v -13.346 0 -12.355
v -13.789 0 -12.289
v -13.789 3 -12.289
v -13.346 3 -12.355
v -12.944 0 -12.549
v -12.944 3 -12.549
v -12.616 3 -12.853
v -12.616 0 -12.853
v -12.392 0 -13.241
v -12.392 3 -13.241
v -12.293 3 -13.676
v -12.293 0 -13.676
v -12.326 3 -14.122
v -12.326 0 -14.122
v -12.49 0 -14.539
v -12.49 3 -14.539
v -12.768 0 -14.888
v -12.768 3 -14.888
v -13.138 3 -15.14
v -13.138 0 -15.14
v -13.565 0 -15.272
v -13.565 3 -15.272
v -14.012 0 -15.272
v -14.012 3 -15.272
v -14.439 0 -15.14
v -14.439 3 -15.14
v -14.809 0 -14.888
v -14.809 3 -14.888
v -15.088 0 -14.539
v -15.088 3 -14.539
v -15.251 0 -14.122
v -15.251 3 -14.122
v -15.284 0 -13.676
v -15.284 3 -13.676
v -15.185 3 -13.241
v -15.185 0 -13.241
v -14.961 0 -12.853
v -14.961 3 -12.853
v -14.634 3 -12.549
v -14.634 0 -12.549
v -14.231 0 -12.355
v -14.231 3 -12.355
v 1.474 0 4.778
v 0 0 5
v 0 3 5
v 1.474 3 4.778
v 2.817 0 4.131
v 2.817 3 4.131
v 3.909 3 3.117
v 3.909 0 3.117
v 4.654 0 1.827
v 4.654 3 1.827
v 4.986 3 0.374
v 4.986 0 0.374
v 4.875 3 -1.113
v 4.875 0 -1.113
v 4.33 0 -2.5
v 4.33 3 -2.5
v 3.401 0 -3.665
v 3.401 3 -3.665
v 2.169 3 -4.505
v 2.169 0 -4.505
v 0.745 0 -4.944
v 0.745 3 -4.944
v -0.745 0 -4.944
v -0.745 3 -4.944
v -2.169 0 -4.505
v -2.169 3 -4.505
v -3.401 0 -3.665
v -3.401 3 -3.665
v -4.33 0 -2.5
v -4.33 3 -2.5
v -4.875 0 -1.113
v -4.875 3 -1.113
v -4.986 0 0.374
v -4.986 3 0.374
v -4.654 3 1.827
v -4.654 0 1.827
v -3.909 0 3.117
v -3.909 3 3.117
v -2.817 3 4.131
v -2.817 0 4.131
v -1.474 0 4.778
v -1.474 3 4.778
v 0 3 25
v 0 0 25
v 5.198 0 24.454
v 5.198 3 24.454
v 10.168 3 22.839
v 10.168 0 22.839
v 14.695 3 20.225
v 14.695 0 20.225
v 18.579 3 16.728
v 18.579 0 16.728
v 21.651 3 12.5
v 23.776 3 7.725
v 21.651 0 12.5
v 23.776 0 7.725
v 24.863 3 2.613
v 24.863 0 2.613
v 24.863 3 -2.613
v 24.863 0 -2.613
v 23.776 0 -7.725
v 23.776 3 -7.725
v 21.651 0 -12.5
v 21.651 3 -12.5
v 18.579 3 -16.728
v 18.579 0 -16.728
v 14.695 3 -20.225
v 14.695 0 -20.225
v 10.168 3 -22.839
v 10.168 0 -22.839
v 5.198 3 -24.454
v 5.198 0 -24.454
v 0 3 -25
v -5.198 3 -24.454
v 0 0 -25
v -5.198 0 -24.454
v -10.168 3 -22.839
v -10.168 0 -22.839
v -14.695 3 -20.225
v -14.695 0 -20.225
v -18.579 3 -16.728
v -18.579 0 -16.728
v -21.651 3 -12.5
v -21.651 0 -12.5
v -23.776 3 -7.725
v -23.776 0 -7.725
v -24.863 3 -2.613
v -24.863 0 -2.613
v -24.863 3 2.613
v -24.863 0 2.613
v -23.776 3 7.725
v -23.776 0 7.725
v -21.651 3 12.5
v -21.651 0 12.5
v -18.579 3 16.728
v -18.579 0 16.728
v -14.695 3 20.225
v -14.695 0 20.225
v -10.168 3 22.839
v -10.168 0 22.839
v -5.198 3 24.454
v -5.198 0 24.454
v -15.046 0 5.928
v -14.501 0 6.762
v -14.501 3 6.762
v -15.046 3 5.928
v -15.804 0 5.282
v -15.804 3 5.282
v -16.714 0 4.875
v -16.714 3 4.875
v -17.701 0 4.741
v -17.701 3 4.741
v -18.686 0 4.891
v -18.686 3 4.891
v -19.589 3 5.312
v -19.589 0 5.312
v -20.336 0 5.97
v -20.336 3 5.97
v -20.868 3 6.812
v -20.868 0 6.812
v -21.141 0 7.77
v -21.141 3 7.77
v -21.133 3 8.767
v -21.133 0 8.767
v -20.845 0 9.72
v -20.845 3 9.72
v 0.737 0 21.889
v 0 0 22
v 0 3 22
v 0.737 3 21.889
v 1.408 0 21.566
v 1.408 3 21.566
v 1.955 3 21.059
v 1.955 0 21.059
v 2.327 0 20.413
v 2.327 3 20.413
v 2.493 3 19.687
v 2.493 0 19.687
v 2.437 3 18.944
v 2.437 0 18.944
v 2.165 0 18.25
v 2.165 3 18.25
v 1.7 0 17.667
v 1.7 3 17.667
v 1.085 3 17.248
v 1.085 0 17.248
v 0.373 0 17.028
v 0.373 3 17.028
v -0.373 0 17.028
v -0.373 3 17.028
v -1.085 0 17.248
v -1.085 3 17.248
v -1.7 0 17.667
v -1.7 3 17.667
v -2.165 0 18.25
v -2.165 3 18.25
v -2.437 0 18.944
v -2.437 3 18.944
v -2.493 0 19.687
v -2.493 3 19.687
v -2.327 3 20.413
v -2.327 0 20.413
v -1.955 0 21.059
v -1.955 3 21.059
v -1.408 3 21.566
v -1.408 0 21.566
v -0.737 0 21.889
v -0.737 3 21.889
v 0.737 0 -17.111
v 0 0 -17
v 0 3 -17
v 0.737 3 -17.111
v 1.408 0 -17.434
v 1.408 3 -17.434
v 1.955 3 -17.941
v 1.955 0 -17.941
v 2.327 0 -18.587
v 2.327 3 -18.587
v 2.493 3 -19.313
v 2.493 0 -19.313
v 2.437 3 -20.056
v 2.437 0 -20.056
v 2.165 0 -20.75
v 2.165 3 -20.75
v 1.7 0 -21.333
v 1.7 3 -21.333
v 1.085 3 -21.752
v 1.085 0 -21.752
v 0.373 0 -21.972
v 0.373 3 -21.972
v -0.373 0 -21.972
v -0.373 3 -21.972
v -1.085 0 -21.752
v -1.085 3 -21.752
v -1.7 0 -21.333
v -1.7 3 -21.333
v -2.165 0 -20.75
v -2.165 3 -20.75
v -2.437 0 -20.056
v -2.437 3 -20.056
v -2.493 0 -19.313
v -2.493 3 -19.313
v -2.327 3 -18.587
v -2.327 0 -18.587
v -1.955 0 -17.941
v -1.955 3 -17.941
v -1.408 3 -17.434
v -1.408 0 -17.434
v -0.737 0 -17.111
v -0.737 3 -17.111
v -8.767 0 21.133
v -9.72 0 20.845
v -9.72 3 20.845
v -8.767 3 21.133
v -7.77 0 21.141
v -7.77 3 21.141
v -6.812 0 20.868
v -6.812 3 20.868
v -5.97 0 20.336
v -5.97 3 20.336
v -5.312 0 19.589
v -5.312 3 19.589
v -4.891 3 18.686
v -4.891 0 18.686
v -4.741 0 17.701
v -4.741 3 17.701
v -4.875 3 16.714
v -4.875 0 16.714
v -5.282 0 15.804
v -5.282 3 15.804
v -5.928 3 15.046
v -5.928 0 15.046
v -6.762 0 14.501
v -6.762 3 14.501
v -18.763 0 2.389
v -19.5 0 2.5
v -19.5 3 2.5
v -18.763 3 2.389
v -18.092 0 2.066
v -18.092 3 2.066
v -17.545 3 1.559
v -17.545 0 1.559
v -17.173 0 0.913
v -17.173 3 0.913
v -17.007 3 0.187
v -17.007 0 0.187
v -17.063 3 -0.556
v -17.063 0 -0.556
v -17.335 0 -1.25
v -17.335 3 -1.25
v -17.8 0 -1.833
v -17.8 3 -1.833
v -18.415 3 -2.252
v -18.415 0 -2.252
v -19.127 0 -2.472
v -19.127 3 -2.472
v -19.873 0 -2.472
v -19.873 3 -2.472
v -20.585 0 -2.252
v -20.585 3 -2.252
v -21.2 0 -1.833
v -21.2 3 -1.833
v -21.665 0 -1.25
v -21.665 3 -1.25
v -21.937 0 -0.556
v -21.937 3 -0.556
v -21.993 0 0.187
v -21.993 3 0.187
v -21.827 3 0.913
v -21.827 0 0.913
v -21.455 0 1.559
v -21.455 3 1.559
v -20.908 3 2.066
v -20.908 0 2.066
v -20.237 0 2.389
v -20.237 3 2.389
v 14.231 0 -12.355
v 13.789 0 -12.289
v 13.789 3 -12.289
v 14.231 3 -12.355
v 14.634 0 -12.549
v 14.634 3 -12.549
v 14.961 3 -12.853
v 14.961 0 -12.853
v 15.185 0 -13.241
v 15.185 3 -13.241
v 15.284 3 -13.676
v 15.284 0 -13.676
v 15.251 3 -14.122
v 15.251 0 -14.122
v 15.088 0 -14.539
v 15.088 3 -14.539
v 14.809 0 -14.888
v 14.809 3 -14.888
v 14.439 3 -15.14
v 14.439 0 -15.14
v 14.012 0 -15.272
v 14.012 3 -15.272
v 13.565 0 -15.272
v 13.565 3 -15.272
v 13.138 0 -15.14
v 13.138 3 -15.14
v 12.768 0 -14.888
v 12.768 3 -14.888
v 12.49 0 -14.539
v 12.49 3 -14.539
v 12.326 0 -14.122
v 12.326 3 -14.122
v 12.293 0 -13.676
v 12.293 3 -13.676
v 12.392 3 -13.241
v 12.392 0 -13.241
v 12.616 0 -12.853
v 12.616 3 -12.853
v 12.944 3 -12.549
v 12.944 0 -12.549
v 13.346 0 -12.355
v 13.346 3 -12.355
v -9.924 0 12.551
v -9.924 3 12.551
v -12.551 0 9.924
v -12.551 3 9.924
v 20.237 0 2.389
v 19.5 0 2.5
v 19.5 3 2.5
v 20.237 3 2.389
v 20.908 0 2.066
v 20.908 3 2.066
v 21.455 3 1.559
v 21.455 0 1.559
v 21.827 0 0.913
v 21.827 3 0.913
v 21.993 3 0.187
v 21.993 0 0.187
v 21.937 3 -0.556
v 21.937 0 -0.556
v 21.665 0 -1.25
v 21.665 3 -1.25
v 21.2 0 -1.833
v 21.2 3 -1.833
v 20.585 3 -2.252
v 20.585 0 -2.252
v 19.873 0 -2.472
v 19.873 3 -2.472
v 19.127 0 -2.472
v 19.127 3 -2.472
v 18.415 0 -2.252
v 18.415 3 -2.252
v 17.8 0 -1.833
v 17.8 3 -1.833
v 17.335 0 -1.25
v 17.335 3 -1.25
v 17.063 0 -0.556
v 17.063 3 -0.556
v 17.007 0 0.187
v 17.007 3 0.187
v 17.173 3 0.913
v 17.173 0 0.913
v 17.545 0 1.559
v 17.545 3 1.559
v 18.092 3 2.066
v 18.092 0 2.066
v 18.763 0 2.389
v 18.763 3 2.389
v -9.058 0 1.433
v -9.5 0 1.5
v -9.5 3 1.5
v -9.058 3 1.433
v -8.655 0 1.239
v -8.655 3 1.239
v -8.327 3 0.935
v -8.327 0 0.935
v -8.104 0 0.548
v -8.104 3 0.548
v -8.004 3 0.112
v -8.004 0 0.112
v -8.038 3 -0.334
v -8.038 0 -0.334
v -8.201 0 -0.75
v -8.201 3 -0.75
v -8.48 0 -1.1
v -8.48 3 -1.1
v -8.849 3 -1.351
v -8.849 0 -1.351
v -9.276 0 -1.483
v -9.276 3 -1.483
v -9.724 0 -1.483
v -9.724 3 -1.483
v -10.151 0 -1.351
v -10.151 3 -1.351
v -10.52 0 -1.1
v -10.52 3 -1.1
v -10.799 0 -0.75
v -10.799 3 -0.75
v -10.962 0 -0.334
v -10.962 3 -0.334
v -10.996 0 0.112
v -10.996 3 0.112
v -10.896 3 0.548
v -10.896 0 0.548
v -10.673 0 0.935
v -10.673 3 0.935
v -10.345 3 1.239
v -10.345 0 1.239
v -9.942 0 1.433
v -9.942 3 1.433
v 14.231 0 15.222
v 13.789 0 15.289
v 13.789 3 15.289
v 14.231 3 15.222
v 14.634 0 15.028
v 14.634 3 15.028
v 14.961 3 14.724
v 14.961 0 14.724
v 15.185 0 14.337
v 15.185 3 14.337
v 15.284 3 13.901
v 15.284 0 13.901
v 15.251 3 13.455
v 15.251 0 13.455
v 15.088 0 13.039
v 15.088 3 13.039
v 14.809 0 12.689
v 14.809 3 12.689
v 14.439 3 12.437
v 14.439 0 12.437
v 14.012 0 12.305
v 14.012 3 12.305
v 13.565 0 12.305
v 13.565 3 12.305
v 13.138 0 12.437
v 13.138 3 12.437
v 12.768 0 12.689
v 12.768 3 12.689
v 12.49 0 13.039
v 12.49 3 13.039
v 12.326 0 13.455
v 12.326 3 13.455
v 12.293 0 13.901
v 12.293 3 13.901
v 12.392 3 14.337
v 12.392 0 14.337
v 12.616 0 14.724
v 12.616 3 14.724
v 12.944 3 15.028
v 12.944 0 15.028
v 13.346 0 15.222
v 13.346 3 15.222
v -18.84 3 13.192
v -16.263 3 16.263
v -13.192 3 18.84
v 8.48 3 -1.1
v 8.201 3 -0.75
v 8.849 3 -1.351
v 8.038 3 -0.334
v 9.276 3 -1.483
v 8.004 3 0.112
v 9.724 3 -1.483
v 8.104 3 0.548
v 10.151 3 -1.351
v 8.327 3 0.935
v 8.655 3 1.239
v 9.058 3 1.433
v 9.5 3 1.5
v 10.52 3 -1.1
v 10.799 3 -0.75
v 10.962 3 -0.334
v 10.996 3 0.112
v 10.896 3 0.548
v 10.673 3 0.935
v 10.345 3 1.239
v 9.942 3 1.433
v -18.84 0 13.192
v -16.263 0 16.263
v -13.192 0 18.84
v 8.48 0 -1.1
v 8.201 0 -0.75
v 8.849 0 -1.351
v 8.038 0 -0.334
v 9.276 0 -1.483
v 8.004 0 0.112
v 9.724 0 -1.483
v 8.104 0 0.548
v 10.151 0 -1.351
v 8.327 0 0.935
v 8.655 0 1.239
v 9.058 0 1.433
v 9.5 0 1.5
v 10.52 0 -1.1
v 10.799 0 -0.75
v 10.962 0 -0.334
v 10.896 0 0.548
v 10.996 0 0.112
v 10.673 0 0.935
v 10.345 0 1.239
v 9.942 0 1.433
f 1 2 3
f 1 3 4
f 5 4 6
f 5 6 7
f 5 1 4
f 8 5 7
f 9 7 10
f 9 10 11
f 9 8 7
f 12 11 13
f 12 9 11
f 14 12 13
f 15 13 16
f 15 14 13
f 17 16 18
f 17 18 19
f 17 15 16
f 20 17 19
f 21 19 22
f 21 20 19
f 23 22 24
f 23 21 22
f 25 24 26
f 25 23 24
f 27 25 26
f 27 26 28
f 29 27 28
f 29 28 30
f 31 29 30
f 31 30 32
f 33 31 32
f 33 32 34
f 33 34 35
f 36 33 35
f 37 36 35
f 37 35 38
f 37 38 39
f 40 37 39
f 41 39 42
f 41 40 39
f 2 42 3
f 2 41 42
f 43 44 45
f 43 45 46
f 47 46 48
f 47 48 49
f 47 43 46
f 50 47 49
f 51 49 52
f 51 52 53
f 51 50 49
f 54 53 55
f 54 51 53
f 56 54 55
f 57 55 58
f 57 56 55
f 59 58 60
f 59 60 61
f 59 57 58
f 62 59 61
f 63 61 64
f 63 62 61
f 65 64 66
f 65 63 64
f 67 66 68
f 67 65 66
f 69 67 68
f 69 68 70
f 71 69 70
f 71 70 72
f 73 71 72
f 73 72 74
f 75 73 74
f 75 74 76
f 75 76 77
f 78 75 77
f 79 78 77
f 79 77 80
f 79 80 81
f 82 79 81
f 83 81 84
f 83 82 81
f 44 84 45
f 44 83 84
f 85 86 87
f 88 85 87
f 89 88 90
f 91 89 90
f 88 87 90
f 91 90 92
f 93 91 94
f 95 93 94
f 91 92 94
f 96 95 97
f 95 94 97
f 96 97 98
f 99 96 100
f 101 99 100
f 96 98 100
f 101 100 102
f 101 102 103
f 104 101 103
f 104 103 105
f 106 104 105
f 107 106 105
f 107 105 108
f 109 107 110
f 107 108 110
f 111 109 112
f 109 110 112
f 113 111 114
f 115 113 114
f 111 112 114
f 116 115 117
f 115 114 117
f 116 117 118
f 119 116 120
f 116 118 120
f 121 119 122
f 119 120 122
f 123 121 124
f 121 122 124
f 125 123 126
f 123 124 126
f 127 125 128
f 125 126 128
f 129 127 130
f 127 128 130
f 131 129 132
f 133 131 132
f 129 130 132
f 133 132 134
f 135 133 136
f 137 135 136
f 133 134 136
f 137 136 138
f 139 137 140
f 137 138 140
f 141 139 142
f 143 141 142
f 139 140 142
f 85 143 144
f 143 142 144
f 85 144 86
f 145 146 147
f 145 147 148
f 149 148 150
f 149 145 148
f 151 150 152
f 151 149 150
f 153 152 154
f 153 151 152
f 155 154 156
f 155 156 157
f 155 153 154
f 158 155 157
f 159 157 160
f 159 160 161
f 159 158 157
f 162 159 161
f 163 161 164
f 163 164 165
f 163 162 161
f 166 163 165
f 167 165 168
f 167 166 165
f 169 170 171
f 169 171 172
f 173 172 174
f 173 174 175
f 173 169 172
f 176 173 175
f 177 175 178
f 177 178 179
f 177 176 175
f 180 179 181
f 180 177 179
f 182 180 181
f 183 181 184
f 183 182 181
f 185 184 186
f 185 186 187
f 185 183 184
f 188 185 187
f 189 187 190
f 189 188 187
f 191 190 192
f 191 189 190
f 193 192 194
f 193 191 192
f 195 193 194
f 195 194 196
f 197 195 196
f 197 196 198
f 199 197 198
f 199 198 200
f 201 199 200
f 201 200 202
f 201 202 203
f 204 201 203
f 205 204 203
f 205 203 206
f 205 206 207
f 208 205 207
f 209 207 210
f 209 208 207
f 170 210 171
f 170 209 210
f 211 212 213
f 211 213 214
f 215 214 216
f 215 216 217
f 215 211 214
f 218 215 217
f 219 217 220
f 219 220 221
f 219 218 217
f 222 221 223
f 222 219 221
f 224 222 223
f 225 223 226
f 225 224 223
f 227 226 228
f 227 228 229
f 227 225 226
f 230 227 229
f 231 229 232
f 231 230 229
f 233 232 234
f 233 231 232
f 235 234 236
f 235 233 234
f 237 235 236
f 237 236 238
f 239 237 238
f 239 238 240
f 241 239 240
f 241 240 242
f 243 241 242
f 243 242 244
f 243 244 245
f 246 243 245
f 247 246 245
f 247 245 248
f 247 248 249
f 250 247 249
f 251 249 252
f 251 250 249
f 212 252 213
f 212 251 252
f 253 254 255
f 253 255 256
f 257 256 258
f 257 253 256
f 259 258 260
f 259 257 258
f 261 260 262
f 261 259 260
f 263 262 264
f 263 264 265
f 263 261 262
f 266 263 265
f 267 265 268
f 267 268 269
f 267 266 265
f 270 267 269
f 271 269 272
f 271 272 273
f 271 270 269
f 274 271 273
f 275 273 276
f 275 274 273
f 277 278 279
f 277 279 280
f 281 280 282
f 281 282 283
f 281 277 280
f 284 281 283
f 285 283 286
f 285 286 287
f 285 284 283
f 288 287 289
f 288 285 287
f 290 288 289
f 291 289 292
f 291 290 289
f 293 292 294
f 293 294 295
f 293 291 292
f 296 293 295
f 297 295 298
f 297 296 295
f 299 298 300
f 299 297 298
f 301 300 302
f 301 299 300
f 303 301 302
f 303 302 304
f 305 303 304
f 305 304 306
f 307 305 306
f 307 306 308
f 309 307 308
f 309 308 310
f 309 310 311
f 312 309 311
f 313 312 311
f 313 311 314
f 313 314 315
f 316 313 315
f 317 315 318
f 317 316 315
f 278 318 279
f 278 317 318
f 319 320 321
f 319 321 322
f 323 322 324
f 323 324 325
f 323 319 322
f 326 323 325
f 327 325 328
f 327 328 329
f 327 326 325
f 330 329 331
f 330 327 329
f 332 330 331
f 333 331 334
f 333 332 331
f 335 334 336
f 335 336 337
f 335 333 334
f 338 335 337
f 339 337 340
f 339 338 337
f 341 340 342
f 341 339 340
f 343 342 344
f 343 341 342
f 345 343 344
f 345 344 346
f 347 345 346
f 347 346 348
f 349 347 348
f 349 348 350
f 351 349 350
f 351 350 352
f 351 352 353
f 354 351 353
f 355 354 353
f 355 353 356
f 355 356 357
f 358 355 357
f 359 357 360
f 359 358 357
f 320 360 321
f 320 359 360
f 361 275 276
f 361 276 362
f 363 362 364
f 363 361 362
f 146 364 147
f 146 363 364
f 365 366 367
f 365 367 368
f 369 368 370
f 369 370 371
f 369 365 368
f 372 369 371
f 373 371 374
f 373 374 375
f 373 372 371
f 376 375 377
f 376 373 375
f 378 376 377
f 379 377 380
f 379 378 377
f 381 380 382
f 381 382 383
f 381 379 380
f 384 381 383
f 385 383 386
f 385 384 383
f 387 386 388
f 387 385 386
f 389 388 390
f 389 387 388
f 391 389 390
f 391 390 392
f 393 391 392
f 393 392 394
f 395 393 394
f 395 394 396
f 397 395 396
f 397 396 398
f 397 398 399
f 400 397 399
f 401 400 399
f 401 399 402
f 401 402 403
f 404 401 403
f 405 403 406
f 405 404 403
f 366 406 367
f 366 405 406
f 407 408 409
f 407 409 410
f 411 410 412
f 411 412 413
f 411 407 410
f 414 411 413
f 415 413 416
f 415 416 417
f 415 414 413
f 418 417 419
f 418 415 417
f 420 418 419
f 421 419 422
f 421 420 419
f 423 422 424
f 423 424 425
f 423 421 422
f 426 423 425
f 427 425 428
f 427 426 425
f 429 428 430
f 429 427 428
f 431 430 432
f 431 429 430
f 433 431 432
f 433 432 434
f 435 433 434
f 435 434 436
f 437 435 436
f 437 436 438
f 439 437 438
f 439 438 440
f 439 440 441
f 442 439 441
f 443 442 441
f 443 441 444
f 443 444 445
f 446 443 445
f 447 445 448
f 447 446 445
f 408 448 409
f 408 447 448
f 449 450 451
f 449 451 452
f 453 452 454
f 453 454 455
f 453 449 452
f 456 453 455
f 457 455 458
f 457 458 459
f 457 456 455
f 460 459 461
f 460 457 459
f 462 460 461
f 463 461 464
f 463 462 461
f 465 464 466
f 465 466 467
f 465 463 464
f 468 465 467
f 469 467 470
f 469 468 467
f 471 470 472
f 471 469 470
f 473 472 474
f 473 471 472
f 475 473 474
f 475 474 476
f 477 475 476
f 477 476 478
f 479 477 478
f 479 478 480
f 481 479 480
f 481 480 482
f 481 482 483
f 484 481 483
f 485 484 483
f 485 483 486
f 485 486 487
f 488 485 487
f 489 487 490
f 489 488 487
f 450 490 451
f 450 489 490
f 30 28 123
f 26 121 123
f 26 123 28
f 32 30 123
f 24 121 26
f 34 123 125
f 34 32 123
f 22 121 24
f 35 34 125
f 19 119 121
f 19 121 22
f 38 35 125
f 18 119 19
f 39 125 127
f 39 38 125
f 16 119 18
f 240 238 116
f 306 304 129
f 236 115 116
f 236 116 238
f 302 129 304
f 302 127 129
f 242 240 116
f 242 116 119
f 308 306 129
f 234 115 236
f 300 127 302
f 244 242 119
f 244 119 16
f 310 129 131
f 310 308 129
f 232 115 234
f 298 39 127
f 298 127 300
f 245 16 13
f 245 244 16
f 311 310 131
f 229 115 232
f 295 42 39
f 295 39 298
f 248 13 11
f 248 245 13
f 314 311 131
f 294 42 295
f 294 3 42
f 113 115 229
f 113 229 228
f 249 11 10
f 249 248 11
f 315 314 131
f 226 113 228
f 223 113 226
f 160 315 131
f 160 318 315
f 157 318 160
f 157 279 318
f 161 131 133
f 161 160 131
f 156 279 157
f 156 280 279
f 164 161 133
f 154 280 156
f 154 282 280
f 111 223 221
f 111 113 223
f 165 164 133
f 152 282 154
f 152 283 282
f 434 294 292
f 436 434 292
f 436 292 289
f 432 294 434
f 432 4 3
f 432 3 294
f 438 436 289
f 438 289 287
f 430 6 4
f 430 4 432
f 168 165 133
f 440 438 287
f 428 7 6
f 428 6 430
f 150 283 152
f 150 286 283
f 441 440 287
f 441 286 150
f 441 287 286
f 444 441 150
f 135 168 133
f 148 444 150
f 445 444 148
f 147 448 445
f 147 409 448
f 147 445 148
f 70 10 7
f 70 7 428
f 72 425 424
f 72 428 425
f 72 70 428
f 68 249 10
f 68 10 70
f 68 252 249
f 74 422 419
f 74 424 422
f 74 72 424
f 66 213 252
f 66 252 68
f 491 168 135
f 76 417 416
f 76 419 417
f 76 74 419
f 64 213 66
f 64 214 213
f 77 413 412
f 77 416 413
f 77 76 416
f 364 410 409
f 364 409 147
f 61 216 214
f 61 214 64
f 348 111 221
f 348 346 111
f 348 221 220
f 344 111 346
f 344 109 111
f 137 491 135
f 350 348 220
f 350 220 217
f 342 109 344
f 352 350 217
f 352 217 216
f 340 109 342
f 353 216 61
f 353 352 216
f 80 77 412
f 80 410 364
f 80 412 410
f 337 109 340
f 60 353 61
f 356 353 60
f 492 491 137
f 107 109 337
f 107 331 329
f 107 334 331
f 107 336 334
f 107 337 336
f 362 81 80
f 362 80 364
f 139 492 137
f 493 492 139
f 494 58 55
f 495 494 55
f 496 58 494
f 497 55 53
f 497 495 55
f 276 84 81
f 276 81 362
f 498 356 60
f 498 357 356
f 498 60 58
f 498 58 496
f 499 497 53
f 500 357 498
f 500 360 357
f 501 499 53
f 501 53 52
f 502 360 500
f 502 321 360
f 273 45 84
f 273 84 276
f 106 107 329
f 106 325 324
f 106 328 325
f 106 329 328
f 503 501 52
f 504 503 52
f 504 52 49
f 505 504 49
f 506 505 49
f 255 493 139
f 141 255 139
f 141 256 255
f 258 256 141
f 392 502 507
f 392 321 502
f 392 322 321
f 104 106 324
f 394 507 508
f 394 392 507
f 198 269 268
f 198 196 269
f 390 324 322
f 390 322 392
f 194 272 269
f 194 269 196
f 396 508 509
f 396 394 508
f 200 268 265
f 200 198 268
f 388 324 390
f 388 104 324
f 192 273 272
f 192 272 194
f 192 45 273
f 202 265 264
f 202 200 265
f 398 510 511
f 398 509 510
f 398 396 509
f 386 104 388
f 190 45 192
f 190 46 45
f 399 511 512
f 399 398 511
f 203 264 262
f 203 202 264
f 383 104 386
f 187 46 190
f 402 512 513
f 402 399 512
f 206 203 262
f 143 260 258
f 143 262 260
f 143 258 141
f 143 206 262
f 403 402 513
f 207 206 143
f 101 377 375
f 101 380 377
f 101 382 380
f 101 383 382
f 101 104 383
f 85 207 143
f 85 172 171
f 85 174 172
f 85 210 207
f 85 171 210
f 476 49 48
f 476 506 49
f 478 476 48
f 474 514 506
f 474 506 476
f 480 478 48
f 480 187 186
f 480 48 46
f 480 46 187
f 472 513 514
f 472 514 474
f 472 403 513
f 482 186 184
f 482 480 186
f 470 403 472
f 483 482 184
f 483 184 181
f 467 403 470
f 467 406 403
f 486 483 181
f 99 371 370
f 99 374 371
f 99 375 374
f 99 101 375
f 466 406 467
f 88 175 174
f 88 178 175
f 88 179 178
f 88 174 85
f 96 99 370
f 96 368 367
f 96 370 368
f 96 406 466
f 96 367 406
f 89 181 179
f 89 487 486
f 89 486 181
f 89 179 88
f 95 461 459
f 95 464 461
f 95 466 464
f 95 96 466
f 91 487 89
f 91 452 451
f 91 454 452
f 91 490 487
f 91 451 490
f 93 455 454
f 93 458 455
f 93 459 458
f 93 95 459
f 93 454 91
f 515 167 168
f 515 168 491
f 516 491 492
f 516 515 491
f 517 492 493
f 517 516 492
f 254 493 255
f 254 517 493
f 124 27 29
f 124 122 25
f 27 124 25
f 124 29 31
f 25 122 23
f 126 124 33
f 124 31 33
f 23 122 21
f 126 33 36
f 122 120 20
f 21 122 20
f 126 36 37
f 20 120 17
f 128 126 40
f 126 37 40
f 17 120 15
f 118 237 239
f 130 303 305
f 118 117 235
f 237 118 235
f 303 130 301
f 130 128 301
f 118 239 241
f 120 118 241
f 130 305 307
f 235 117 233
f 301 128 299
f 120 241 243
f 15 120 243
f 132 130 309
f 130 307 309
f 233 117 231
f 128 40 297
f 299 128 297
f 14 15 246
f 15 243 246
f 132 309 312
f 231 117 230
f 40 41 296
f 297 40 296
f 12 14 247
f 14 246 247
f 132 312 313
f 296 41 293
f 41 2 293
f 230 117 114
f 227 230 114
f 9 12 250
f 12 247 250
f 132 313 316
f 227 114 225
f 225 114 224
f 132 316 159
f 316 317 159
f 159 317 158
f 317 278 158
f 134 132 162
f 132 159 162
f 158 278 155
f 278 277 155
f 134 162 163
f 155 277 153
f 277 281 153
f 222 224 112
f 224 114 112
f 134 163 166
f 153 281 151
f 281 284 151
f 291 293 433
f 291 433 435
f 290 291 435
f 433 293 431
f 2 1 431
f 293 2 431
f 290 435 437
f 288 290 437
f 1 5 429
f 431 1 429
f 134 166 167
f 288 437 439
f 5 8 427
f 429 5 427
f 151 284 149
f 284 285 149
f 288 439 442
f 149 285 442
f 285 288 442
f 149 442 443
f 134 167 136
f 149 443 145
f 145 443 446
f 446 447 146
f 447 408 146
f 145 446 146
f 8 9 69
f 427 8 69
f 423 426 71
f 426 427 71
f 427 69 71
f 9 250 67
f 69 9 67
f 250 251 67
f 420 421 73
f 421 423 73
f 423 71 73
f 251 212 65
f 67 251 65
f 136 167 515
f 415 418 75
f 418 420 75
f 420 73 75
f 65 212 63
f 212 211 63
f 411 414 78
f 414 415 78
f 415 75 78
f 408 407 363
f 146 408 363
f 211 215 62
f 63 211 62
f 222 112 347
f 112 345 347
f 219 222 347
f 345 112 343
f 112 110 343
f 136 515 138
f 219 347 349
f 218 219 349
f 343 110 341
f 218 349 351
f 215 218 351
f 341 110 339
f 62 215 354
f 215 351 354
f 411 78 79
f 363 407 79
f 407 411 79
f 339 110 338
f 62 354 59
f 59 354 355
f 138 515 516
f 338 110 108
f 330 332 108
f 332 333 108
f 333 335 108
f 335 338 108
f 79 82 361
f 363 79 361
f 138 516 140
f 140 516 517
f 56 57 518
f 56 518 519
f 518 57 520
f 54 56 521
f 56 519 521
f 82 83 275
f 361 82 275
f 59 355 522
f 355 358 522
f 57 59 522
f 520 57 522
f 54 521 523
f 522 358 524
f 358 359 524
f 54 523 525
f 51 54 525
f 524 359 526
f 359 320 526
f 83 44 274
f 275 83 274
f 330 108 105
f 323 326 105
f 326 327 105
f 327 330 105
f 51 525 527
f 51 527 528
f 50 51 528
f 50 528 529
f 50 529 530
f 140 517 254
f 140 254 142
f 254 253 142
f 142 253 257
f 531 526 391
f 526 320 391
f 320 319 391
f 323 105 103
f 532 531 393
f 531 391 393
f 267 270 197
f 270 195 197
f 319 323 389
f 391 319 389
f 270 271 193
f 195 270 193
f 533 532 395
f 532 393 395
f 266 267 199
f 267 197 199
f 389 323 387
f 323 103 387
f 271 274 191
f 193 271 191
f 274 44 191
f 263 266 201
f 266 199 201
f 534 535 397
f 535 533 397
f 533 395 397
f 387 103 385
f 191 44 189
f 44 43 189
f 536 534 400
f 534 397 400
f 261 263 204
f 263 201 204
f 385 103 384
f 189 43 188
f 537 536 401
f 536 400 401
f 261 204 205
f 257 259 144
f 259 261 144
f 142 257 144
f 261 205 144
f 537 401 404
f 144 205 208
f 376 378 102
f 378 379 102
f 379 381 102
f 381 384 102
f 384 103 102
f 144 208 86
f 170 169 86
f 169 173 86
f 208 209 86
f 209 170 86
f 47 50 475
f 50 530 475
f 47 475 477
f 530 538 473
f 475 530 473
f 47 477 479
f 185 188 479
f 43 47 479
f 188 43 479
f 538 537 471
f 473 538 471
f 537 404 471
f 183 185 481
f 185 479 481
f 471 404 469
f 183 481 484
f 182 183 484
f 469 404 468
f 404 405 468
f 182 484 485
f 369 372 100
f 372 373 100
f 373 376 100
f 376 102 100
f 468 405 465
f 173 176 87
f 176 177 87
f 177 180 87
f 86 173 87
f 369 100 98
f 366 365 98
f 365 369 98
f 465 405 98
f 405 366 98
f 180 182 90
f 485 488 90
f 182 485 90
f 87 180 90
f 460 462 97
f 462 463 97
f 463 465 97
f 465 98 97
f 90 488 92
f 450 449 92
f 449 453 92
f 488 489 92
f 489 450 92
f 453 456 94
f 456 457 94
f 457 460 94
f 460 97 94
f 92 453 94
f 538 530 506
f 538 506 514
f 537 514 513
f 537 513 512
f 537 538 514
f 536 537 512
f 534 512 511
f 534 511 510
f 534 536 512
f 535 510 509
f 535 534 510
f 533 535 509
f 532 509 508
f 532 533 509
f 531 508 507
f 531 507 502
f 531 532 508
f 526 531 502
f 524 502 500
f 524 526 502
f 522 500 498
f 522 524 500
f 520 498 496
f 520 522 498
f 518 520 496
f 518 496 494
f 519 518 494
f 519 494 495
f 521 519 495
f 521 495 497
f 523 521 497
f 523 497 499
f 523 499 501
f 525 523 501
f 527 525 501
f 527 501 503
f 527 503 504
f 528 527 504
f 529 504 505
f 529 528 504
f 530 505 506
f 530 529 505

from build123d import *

# Parameters (mm, degrees)
SKETCH_1_R      = 25
SKETCH_1_R_2    = 5
SKETCH_1_R_3    = 1.5
SKETCH_1_R_4    = 2.5
EXTRUDE_1_DEPTH = 3


with BuildPart() as part:
    # 草圖1 → 填料-伸長1 (new body)
    with BuildSketch(Plane(origin=(0, 0, 0), x_dir=(1, 0, 0), z_dir=(0, 1, 0))):
        with Locations(Location((0, 0, 0), (0, 0, 270))):
            Circle(SKETCH_1_R)
        with Locations(Location((0, 0, 0), (0, 0, 270))):
            Circle(SKETCH_1_R_2, mode=Mode.SUBTRACT)
        with Locations(Location((-9.5, 0, 0), (0, 0, 270))):
            Circle(SKETCH_1_R_3, mode=Mode.SUBTRACT)
        with Locations(Location((9.5, 0, 0), (0, 0, 270))):
            Circle(SKETCH_1_R_3, mode=Mode.SUBTRACT)
        with Locations(Location((0, 19.5, 0), (0, 0, 270))):
            Circle(SKETCH_1_R_4, mode=Mode.SUBTRACT)
        with Locations(Location((19.5, 0, 0), (0, 0, 270))):
            Circle(SKETCH_1_R_4, mode=Mode.SUBTRACT)
        with Locations(Location((0, -19.5, 0), (0, 0, 270))):
            Circle(SKETCH_1_R_4, mode=Mode.SUBTRACT)
        with Locations(Location((-19.5, 0, 0), (0, 0, 270))):
            Circle(SKETCH_1_R_4, mode=Mode.SUBTRACT)
        with Locations(Location((-13.788582233, 13.788582233, 0), (0, 0, 270))):
            Circle(SKETCH_1_R_3, mode=Mode.SUBTRACT)
        with Locations(Location((13.788582233, 13.788582233, 0), (0, 0, 270))):
            Circle(SKETCH_1_R_3, mode=Mode.SUBTRACT)
        with Locations(Location((13.788582233, -13.788582233, 0), (0, 0, 270))):
            Circle(SKETCH_1_R_3, mode=Mode.SUBTRACT)
        with BuildLine():
            ThreePointArc((-20.845079102, -9.72022002), (-16.263455967, -16.263455967), (-9.72022002, -20.845079102))
            ThreePointArc((-9.72022002, -20.845079102), (-5.068978849, -19.152165763), (-6.761892188, -14.500924593))
            ThreePointArc((-6.761892188, -14.500924593), (-11.313708499, -11.313708499), (-14.500924593, -6.761892188))
            ThreePointArc((-14.500924593, -6.761892188), (-19.152165763, -5.068978849), (-20.845079102, -9.72022002))
        make_face(mode=Mode.SUBTRACT)
    extrude(amount=EXTRUDE_1_DEPTH)


solid = part.part
